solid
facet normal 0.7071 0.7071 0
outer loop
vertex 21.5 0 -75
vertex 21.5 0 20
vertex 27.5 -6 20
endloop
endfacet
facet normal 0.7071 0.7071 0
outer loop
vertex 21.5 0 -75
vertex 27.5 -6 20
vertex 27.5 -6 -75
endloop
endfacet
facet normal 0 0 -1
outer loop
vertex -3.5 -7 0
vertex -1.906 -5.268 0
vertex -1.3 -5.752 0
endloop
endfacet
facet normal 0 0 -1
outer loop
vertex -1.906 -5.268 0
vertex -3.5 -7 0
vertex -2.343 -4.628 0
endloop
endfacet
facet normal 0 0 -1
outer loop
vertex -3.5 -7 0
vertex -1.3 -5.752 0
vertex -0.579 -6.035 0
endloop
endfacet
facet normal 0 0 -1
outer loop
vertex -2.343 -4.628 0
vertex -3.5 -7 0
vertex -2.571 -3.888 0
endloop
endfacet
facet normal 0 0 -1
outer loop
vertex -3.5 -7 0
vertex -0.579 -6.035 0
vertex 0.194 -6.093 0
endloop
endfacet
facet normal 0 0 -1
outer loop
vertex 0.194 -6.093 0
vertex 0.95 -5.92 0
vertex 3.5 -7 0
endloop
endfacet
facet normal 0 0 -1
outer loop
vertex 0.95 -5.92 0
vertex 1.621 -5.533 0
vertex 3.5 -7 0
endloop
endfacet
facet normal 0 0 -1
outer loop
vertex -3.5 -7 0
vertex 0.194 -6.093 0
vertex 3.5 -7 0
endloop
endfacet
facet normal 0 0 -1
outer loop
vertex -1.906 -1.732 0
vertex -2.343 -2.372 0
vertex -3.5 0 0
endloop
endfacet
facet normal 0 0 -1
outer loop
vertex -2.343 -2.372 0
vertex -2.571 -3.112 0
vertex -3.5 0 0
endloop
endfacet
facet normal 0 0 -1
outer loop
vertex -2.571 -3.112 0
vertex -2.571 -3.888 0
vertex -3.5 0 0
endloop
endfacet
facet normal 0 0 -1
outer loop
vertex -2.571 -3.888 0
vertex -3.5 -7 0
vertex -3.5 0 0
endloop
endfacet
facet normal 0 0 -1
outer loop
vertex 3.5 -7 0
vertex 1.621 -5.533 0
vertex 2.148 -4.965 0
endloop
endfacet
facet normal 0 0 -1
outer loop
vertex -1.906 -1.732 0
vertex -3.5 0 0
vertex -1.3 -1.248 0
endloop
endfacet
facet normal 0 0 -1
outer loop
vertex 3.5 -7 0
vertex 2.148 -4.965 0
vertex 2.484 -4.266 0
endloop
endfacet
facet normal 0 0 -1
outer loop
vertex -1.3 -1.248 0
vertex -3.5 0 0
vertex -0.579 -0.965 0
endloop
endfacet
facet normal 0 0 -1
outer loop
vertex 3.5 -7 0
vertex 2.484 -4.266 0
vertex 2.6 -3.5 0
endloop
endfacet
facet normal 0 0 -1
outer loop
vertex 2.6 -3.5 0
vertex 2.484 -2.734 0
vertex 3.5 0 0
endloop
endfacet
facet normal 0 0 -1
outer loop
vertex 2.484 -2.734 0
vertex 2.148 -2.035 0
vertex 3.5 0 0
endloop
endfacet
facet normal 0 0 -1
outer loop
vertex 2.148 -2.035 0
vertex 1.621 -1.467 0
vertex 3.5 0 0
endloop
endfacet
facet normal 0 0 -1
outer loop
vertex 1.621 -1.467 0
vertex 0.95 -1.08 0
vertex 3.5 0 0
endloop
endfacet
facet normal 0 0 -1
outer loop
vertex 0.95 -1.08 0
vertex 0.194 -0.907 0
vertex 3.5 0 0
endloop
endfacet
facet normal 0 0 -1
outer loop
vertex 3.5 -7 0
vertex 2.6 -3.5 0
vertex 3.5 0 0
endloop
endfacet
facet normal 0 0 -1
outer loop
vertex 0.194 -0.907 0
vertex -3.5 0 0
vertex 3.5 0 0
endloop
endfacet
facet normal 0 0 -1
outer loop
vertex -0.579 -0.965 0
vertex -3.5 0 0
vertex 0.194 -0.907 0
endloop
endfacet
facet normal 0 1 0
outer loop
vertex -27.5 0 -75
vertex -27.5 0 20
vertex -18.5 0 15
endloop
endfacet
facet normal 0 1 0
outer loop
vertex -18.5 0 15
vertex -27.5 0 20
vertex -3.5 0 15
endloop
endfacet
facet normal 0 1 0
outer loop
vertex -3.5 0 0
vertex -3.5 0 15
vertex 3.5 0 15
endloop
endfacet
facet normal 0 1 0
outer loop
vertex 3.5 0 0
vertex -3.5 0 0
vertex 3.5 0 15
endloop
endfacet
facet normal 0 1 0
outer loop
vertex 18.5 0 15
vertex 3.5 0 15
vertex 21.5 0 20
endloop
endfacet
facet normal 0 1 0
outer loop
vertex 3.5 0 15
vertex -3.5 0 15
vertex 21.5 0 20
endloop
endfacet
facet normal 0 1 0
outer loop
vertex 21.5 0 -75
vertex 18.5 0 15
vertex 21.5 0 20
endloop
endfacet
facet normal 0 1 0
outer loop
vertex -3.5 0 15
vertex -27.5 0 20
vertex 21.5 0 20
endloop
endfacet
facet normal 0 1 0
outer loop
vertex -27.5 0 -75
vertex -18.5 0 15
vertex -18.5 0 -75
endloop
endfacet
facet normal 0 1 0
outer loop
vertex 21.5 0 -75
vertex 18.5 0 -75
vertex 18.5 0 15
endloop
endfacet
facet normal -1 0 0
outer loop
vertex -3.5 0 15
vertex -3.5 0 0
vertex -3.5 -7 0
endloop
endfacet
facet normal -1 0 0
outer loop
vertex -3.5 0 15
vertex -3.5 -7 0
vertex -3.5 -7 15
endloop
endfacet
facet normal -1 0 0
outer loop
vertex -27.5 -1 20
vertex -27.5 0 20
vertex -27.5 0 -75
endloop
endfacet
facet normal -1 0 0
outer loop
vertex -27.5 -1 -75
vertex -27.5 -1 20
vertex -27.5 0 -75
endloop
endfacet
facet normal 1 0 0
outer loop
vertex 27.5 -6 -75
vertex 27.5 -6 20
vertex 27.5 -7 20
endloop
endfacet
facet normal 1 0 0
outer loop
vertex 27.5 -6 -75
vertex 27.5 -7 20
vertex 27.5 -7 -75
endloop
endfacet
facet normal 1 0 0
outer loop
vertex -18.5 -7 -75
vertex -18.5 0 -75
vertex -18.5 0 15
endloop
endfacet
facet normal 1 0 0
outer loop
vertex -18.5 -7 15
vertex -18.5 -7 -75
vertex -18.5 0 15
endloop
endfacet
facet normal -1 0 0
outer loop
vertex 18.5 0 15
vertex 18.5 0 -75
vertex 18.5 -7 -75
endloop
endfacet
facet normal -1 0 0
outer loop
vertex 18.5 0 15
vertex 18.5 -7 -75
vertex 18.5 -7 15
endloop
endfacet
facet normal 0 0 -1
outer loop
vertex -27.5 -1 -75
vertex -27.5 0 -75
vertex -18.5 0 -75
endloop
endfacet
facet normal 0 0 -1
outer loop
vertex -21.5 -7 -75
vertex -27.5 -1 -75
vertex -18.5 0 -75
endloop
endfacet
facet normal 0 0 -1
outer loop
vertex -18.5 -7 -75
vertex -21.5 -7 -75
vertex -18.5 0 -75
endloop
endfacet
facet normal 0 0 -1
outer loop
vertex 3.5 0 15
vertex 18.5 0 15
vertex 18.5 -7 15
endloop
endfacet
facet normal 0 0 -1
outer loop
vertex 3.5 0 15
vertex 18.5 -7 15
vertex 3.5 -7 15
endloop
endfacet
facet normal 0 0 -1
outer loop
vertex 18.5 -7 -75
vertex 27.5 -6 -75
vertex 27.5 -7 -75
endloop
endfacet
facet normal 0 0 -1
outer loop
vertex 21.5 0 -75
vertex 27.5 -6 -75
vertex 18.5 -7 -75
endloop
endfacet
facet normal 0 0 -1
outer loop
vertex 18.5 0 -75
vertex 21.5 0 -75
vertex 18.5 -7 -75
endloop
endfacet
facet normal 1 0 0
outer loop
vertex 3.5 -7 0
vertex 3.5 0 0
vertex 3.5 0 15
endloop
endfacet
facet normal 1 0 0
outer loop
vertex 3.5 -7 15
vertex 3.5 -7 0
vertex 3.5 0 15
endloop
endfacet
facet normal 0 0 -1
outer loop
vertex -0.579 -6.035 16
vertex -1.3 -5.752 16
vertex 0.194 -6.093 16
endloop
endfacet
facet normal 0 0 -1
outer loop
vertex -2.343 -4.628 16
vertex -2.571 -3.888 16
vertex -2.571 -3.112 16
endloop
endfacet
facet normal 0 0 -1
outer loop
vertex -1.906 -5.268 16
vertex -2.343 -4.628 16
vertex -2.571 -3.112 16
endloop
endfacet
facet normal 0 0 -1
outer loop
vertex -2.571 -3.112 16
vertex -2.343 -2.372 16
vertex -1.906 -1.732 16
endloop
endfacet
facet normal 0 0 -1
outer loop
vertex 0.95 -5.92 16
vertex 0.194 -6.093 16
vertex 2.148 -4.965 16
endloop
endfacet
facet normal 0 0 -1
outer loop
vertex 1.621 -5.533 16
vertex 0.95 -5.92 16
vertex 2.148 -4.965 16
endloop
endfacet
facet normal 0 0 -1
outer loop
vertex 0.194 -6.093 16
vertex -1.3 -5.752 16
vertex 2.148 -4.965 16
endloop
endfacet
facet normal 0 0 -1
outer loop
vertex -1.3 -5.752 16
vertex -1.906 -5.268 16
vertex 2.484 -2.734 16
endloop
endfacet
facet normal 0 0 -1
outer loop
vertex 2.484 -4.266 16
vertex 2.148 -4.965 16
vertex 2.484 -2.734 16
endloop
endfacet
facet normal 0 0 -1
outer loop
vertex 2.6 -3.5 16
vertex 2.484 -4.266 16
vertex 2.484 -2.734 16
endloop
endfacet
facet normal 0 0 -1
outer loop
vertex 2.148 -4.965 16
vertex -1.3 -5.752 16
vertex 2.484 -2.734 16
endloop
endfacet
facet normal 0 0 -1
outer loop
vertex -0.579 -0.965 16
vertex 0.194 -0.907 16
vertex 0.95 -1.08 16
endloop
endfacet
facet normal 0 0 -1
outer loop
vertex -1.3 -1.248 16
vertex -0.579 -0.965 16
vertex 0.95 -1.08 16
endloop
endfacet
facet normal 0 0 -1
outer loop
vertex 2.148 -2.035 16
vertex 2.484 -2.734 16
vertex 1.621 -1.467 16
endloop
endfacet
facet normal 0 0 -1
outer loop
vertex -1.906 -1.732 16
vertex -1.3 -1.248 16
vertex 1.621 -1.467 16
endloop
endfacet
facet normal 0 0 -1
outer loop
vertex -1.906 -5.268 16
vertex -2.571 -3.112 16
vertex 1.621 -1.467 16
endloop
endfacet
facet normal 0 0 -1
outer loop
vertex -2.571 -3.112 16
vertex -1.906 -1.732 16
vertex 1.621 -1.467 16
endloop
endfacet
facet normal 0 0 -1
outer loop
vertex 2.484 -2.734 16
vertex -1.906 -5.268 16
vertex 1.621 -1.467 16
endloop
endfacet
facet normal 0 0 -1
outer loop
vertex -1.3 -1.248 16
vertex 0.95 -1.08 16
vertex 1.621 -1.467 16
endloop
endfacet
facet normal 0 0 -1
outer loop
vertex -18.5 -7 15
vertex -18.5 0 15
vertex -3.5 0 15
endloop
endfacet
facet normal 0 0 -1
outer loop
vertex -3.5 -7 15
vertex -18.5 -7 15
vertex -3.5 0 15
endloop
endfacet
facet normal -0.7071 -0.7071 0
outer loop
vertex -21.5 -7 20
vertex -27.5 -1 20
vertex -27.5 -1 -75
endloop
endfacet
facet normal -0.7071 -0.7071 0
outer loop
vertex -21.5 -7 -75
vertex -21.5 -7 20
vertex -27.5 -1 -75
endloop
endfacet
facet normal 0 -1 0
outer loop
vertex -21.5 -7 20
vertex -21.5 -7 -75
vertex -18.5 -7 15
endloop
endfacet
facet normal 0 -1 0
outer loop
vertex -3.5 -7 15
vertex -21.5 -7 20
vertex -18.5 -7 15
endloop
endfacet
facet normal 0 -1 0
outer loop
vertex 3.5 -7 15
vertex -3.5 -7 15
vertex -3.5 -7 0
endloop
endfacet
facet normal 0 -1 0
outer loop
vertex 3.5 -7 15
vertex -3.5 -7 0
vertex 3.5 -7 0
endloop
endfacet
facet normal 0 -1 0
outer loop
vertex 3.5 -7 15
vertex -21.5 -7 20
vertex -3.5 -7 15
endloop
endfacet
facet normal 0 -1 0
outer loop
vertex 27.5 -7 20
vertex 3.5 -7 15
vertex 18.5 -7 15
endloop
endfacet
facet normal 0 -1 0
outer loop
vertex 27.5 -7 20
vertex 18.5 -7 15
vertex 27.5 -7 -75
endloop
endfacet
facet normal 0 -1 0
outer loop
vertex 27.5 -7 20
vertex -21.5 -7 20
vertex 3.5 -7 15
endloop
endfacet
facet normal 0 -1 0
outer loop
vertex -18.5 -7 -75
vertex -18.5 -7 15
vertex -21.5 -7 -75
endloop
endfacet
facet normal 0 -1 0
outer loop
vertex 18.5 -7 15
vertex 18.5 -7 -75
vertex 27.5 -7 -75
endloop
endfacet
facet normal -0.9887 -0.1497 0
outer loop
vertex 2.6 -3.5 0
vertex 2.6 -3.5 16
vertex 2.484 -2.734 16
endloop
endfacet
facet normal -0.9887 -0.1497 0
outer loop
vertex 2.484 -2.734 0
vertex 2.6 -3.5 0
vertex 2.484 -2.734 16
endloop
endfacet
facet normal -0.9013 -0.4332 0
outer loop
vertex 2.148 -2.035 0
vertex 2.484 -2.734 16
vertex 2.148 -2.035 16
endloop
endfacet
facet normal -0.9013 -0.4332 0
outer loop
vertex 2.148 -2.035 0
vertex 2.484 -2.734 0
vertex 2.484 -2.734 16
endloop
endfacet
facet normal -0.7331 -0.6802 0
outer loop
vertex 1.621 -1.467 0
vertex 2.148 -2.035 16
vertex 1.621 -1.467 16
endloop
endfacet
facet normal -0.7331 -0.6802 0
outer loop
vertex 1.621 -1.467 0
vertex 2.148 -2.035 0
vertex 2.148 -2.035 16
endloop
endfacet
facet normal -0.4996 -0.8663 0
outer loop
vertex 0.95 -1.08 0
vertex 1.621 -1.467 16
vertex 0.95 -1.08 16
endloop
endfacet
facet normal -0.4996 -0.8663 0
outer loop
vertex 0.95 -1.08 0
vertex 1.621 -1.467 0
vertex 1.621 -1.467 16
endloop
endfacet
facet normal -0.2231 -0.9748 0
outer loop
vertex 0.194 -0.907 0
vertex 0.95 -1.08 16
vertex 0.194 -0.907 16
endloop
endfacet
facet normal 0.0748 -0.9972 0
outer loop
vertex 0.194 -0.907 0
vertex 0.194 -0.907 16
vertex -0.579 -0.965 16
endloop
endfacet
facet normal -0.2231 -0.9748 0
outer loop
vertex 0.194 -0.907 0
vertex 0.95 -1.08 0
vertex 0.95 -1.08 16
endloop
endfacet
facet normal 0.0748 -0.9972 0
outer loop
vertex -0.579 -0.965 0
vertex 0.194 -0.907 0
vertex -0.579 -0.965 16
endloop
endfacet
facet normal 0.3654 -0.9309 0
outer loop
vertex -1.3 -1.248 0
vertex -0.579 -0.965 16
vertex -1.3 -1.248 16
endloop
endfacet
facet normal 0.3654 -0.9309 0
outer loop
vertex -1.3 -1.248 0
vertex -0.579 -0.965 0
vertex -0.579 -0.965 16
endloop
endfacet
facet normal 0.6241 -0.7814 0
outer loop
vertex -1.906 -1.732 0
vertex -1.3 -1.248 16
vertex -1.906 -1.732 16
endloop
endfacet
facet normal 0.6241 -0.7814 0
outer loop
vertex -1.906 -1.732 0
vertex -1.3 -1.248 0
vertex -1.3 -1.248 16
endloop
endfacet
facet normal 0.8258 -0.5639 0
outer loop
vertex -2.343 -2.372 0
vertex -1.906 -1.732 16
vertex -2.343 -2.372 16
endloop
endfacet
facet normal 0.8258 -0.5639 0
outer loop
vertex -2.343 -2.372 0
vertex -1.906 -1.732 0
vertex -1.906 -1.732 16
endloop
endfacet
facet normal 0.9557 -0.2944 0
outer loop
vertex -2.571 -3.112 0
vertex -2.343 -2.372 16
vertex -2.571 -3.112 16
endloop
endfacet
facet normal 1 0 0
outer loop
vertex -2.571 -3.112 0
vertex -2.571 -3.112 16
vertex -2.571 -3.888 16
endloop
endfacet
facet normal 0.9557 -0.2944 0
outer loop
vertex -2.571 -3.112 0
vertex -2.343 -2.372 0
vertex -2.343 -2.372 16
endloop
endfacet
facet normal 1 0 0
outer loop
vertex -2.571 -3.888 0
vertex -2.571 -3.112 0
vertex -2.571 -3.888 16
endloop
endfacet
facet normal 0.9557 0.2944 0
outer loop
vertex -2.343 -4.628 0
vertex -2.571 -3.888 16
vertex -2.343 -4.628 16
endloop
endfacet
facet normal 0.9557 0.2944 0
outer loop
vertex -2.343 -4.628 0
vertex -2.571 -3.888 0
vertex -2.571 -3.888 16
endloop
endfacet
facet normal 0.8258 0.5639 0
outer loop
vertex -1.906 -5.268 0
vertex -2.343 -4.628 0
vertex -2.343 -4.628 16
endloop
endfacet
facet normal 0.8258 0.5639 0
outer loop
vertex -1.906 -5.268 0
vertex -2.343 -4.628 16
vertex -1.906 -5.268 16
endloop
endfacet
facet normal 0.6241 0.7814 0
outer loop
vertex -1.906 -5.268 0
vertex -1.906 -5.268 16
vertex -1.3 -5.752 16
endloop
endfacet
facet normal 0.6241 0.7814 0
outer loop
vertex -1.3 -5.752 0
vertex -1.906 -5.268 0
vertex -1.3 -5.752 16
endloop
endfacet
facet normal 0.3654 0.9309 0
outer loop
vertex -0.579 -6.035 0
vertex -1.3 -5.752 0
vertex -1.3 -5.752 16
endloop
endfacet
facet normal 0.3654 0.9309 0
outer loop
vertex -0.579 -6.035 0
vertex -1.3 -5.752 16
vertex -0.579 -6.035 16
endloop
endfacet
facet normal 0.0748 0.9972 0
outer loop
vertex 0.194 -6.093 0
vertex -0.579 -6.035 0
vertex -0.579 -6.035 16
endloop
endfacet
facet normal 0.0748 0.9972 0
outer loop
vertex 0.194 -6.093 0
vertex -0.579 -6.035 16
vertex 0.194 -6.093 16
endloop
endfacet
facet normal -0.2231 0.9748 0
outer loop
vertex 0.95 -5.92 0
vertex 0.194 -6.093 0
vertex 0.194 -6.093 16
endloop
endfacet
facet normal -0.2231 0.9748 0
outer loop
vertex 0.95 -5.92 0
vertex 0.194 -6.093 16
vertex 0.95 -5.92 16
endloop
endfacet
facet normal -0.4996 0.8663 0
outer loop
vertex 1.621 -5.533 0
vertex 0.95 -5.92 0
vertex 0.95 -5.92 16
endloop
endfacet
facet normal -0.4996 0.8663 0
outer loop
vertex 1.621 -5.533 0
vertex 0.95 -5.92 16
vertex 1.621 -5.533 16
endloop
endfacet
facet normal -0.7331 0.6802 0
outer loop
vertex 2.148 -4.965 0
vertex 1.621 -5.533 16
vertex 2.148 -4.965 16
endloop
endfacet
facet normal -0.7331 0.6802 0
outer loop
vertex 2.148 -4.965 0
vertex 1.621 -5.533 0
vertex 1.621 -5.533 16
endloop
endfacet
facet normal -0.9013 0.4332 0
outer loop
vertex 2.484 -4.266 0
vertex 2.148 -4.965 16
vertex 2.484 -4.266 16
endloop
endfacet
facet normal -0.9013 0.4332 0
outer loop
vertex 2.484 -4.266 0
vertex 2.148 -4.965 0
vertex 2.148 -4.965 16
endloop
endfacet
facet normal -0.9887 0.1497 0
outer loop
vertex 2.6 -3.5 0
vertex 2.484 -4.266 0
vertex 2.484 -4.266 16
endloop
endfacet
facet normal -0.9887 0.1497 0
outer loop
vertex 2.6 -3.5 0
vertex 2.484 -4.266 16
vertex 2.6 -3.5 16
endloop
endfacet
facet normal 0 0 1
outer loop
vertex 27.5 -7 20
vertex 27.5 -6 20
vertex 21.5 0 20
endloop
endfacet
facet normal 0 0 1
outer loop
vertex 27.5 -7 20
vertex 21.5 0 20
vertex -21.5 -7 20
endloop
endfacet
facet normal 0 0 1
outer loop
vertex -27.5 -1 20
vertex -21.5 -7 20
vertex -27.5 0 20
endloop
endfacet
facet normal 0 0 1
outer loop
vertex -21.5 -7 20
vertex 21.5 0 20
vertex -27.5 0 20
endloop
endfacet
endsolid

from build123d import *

# Parameters (mm, degrees)
F0_W     = 7
F0_H     = 15
F0_W_2   = 15
F0_H_2   = 5
F0_W_3   = 9
F0_H_3   = 90
F1_DEPTH = 7
F3_R     = 2.6
F4_DEPTH = 16
F5_SIZE  = 6
F6_SIZE  = 6


with BuildPart() as f1:
    # F0 (on Front) → F1 (new body)
    with BuildSketch(Plane.XZ):
        with Locations((0, 7.5)):
            Rectangle(F0_W, F0_H)
        with Locations((-11, 17.5)):
            Rectangle(F0_W_2, F0_H_2)
        with Locations((0, 17.5)):
            Rectangle(F0_W, F0_H_2)
        with Locations((-23, -30)):
            Rectangle(F0_W_3, F0_H_3)
        with Locations((-23, 17.5)):
            Rectangle(F0_W_3, F0_H_2)
    extrude(amount=F1_DEPTH)

    # F2: F1 across plane


with BuildPart() as f1_1:
    add(f1.part)
    add(f1.part.mirror(Plane.YZ))

    # F3 (on Top) → F4 (cut)
    with BuildSketch(Plane.XY):
        with Locations((0, -3.5)):
            Circle(F3_R)
    extrude(amount=F4_DEPTH, mode=Mode.SUBTRACT)

    # F5
    f5_edges = [f1_1.edges().sort_by_distance(p)[0] for p in [
        (-27.5, -7, -27.5),
    ]]
    chamfer(f5_edges, length=F5_SIZE)

    # F6
    f6_edges = [f1_1.edges().sort_by_distance(p)[0] for p in [
        (27.5, 0, -27.5),
    ]]
    chamfer(f6_edges, length=F6_SIZE)


solid = f1_1.part
